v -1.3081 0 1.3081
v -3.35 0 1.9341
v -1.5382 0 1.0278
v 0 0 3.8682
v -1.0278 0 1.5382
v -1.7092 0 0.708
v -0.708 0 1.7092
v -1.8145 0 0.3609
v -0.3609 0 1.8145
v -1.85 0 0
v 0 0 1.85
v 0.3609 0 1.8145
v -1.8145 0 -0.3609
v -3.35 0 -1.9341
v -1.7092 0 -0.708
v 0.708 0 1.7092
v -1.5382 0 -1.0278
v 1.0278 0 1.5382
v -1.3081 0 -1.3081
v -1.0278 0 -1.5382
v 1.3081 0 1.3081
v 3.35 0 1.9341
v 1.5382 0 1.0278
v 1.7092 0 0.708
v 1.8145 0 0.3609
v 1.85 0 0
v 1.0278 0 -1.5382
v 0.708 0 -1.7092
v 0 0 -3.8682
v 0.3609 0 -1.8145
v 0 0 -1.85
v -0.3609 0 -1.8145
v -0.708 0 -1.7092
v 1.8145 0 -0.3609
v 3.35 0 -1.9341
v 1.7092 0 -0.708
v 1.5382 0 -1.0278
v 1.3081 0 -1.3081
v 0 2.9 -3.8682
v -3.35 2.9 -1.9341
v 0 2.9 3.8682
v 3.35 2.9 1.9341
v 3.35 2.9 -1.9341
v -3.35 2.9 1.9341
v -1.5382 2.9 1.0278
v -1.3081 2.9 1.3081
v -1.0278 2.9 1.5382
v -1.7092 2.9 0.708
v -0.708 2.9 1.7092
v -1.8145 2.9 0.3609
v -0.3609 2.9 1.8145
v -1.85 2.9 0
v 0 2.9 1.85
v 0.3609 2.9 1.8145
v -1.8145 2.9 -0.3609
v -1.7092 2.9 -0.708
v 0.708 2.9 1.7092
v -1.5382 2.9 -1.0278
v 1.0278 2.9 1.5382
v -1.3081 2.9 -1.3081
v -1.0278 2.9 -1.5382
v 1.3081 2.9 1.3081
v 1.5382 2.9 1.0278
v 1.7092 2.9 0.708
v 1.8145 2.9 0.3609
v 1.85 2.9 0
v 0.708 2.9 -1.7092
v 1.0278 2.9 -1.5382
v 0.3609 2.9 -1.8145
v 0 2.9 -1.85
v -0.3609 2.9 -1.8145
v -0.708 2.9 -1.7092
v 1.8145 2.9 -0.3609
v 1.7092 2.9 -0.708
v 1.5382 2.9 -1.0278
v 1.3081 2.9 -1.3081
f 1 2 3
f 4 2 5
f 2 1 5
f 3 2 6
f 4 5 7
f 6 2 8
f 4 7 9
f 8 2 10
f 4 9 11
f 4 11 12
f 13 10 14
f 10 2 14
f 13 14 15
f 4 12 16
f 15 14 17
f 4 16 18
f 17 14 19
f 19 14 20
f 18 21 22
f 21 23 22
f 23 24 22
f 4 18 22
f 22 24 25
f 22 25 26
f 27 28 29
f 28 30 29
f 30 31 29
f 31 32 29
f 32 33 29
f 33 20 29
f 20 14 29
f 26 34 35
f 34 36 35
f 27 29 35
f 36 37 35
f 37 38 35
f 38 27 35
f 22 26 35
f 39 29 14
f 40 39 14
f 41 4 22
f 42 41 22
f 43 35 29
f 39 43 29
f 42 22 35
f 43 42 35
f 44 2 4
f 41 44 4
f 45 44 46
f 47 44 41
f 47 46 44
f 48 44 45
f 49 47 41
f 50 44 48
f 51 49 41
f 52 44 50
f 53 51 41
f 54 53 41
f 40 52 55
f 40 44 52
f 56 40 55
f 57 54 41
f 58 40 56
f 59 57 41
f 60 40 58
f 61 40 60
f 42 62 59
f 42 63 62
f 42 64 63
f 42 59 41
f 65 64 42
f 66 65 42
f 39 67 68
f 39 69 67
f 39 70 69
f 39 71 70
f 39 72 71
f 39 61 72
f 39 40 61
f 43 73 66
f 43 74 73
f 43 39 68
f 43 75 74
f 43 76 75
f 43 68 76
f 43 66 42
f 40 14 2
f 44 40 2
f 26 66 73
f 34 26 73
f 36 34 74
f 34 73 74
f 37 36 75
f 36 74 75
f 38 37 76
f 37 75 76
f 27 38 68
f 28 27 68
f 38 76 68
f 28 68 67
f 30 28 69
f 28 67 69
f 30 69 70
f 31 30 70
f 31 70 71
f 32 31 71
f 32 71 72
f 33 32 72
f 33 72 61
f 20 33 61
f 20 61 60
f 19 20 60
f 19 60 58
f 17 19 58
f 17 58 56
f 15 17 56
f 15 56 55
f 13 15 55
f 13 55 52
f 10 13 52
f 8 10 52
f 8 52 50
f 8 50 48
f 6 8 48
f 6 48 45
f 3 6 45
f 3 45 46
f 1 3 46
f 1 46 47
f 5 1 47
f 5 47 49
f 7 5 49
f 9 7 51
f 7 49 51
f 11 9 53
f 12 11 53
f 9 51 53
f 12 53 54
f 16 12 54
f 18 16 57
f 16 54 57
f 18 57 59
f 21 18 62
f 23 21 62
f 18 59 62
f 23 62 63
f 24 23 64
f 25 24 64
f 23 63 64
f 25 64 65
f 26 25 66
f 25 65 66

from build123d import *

# Parameters (mm, degrees)
BOSS_EXTRUDE1_DEPTH = 2.9
CUT_EXTRUDE1_REACH  = 4.9
SKETCH2_R           = 1.85


with BuildPart() as part:
    # Sketch1 → Boss-Extrude1 (new body)
    with BuildSketch(Plane(origin=(0, 0, 0), x_dir=(1, 0, 0), z_dir=(0, 1, 0))):
        Polygon((0, 3.868246804), (-3.35, 1.934123402), (-3.35, -1.934123402), (0, -3.868246804), (3.35, -1.934123402), (3.35, 1.934123402), align=None)
    extrude(amount=BOSS_EXTRUDE1_DEPTH)

    # Sketch2 → Cut-Extrude1 (cut, up to next)
    with BuildSketch(Plane(origin=(0, 2.9, 0), x_dir=(1, 0, 0), z_dir=(0, 1, 0)), mode=Mode.PRIVATE) as cut_extrude1_sk1:
        Circle(SKETCH2_R)
    cut_extrude1_tool1 = extrude(cut_extrude1_sk1.sketch, amount=-CUT_EXTRUDE1_REACH, mode=Mode.PRIVATE) & part.part
    add(cut_extrude1_tool1.solids().sort_by_distance((0, 2.9, 0))[0], mode=Mode.SUBTRACT)


solid = part.part
